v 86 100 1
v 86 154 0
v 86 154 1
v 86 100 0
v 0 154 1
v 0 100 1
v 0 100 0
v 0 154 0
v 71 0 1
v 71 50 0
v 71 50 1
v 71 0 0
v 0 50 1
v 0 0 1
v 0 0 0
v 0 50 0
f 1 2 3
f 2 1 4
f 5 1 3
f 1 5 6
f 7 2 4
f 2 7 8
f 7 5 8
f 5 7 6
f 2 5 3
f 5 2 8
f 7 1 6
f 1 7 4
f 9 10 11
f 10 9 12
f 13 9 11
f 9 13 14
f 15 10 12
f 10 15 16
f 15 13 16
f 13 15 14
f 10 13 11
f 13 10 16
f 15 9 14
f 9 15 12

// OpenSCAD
// file: card.scad
module card() {
    cardX = 86;
    cardY = 54;
    
    module roundedcube(x, y, z){
        cube([x, y, z]);
    }
    module chip() {
        color([0,0,0])
        translate([9, cardY - 18, 0])
        roundedcube(10, 9, 1);
    }
    module qrCode() {
        width = 40;
        height = 40;
        color([0, 0, 0])
        translate([cardX - width - 7, (cardY - height) / 2, 0])
        cube([width, height, 1]);
    }
    difference() {
        difference() {
            roundedcube(cardX, cardY, 1);
            translate([0, 0, -0.5]) resize([0, 0, 2]) chip();      
        }
        translate([0, 0, -0.5]) resize([0, 0, 2]) qrCode();
    } 
    
    chip();
    
    qrCode();
}

card();
// file: mirror.scad
module mirror() {
    color([0, 0, 1])
    cube([71, 50, 1]);
}
mirror();
// main file
use <mirror.scad>;
use <card.scad>;

mirror();
translate([0, 100, 0])
    card();
